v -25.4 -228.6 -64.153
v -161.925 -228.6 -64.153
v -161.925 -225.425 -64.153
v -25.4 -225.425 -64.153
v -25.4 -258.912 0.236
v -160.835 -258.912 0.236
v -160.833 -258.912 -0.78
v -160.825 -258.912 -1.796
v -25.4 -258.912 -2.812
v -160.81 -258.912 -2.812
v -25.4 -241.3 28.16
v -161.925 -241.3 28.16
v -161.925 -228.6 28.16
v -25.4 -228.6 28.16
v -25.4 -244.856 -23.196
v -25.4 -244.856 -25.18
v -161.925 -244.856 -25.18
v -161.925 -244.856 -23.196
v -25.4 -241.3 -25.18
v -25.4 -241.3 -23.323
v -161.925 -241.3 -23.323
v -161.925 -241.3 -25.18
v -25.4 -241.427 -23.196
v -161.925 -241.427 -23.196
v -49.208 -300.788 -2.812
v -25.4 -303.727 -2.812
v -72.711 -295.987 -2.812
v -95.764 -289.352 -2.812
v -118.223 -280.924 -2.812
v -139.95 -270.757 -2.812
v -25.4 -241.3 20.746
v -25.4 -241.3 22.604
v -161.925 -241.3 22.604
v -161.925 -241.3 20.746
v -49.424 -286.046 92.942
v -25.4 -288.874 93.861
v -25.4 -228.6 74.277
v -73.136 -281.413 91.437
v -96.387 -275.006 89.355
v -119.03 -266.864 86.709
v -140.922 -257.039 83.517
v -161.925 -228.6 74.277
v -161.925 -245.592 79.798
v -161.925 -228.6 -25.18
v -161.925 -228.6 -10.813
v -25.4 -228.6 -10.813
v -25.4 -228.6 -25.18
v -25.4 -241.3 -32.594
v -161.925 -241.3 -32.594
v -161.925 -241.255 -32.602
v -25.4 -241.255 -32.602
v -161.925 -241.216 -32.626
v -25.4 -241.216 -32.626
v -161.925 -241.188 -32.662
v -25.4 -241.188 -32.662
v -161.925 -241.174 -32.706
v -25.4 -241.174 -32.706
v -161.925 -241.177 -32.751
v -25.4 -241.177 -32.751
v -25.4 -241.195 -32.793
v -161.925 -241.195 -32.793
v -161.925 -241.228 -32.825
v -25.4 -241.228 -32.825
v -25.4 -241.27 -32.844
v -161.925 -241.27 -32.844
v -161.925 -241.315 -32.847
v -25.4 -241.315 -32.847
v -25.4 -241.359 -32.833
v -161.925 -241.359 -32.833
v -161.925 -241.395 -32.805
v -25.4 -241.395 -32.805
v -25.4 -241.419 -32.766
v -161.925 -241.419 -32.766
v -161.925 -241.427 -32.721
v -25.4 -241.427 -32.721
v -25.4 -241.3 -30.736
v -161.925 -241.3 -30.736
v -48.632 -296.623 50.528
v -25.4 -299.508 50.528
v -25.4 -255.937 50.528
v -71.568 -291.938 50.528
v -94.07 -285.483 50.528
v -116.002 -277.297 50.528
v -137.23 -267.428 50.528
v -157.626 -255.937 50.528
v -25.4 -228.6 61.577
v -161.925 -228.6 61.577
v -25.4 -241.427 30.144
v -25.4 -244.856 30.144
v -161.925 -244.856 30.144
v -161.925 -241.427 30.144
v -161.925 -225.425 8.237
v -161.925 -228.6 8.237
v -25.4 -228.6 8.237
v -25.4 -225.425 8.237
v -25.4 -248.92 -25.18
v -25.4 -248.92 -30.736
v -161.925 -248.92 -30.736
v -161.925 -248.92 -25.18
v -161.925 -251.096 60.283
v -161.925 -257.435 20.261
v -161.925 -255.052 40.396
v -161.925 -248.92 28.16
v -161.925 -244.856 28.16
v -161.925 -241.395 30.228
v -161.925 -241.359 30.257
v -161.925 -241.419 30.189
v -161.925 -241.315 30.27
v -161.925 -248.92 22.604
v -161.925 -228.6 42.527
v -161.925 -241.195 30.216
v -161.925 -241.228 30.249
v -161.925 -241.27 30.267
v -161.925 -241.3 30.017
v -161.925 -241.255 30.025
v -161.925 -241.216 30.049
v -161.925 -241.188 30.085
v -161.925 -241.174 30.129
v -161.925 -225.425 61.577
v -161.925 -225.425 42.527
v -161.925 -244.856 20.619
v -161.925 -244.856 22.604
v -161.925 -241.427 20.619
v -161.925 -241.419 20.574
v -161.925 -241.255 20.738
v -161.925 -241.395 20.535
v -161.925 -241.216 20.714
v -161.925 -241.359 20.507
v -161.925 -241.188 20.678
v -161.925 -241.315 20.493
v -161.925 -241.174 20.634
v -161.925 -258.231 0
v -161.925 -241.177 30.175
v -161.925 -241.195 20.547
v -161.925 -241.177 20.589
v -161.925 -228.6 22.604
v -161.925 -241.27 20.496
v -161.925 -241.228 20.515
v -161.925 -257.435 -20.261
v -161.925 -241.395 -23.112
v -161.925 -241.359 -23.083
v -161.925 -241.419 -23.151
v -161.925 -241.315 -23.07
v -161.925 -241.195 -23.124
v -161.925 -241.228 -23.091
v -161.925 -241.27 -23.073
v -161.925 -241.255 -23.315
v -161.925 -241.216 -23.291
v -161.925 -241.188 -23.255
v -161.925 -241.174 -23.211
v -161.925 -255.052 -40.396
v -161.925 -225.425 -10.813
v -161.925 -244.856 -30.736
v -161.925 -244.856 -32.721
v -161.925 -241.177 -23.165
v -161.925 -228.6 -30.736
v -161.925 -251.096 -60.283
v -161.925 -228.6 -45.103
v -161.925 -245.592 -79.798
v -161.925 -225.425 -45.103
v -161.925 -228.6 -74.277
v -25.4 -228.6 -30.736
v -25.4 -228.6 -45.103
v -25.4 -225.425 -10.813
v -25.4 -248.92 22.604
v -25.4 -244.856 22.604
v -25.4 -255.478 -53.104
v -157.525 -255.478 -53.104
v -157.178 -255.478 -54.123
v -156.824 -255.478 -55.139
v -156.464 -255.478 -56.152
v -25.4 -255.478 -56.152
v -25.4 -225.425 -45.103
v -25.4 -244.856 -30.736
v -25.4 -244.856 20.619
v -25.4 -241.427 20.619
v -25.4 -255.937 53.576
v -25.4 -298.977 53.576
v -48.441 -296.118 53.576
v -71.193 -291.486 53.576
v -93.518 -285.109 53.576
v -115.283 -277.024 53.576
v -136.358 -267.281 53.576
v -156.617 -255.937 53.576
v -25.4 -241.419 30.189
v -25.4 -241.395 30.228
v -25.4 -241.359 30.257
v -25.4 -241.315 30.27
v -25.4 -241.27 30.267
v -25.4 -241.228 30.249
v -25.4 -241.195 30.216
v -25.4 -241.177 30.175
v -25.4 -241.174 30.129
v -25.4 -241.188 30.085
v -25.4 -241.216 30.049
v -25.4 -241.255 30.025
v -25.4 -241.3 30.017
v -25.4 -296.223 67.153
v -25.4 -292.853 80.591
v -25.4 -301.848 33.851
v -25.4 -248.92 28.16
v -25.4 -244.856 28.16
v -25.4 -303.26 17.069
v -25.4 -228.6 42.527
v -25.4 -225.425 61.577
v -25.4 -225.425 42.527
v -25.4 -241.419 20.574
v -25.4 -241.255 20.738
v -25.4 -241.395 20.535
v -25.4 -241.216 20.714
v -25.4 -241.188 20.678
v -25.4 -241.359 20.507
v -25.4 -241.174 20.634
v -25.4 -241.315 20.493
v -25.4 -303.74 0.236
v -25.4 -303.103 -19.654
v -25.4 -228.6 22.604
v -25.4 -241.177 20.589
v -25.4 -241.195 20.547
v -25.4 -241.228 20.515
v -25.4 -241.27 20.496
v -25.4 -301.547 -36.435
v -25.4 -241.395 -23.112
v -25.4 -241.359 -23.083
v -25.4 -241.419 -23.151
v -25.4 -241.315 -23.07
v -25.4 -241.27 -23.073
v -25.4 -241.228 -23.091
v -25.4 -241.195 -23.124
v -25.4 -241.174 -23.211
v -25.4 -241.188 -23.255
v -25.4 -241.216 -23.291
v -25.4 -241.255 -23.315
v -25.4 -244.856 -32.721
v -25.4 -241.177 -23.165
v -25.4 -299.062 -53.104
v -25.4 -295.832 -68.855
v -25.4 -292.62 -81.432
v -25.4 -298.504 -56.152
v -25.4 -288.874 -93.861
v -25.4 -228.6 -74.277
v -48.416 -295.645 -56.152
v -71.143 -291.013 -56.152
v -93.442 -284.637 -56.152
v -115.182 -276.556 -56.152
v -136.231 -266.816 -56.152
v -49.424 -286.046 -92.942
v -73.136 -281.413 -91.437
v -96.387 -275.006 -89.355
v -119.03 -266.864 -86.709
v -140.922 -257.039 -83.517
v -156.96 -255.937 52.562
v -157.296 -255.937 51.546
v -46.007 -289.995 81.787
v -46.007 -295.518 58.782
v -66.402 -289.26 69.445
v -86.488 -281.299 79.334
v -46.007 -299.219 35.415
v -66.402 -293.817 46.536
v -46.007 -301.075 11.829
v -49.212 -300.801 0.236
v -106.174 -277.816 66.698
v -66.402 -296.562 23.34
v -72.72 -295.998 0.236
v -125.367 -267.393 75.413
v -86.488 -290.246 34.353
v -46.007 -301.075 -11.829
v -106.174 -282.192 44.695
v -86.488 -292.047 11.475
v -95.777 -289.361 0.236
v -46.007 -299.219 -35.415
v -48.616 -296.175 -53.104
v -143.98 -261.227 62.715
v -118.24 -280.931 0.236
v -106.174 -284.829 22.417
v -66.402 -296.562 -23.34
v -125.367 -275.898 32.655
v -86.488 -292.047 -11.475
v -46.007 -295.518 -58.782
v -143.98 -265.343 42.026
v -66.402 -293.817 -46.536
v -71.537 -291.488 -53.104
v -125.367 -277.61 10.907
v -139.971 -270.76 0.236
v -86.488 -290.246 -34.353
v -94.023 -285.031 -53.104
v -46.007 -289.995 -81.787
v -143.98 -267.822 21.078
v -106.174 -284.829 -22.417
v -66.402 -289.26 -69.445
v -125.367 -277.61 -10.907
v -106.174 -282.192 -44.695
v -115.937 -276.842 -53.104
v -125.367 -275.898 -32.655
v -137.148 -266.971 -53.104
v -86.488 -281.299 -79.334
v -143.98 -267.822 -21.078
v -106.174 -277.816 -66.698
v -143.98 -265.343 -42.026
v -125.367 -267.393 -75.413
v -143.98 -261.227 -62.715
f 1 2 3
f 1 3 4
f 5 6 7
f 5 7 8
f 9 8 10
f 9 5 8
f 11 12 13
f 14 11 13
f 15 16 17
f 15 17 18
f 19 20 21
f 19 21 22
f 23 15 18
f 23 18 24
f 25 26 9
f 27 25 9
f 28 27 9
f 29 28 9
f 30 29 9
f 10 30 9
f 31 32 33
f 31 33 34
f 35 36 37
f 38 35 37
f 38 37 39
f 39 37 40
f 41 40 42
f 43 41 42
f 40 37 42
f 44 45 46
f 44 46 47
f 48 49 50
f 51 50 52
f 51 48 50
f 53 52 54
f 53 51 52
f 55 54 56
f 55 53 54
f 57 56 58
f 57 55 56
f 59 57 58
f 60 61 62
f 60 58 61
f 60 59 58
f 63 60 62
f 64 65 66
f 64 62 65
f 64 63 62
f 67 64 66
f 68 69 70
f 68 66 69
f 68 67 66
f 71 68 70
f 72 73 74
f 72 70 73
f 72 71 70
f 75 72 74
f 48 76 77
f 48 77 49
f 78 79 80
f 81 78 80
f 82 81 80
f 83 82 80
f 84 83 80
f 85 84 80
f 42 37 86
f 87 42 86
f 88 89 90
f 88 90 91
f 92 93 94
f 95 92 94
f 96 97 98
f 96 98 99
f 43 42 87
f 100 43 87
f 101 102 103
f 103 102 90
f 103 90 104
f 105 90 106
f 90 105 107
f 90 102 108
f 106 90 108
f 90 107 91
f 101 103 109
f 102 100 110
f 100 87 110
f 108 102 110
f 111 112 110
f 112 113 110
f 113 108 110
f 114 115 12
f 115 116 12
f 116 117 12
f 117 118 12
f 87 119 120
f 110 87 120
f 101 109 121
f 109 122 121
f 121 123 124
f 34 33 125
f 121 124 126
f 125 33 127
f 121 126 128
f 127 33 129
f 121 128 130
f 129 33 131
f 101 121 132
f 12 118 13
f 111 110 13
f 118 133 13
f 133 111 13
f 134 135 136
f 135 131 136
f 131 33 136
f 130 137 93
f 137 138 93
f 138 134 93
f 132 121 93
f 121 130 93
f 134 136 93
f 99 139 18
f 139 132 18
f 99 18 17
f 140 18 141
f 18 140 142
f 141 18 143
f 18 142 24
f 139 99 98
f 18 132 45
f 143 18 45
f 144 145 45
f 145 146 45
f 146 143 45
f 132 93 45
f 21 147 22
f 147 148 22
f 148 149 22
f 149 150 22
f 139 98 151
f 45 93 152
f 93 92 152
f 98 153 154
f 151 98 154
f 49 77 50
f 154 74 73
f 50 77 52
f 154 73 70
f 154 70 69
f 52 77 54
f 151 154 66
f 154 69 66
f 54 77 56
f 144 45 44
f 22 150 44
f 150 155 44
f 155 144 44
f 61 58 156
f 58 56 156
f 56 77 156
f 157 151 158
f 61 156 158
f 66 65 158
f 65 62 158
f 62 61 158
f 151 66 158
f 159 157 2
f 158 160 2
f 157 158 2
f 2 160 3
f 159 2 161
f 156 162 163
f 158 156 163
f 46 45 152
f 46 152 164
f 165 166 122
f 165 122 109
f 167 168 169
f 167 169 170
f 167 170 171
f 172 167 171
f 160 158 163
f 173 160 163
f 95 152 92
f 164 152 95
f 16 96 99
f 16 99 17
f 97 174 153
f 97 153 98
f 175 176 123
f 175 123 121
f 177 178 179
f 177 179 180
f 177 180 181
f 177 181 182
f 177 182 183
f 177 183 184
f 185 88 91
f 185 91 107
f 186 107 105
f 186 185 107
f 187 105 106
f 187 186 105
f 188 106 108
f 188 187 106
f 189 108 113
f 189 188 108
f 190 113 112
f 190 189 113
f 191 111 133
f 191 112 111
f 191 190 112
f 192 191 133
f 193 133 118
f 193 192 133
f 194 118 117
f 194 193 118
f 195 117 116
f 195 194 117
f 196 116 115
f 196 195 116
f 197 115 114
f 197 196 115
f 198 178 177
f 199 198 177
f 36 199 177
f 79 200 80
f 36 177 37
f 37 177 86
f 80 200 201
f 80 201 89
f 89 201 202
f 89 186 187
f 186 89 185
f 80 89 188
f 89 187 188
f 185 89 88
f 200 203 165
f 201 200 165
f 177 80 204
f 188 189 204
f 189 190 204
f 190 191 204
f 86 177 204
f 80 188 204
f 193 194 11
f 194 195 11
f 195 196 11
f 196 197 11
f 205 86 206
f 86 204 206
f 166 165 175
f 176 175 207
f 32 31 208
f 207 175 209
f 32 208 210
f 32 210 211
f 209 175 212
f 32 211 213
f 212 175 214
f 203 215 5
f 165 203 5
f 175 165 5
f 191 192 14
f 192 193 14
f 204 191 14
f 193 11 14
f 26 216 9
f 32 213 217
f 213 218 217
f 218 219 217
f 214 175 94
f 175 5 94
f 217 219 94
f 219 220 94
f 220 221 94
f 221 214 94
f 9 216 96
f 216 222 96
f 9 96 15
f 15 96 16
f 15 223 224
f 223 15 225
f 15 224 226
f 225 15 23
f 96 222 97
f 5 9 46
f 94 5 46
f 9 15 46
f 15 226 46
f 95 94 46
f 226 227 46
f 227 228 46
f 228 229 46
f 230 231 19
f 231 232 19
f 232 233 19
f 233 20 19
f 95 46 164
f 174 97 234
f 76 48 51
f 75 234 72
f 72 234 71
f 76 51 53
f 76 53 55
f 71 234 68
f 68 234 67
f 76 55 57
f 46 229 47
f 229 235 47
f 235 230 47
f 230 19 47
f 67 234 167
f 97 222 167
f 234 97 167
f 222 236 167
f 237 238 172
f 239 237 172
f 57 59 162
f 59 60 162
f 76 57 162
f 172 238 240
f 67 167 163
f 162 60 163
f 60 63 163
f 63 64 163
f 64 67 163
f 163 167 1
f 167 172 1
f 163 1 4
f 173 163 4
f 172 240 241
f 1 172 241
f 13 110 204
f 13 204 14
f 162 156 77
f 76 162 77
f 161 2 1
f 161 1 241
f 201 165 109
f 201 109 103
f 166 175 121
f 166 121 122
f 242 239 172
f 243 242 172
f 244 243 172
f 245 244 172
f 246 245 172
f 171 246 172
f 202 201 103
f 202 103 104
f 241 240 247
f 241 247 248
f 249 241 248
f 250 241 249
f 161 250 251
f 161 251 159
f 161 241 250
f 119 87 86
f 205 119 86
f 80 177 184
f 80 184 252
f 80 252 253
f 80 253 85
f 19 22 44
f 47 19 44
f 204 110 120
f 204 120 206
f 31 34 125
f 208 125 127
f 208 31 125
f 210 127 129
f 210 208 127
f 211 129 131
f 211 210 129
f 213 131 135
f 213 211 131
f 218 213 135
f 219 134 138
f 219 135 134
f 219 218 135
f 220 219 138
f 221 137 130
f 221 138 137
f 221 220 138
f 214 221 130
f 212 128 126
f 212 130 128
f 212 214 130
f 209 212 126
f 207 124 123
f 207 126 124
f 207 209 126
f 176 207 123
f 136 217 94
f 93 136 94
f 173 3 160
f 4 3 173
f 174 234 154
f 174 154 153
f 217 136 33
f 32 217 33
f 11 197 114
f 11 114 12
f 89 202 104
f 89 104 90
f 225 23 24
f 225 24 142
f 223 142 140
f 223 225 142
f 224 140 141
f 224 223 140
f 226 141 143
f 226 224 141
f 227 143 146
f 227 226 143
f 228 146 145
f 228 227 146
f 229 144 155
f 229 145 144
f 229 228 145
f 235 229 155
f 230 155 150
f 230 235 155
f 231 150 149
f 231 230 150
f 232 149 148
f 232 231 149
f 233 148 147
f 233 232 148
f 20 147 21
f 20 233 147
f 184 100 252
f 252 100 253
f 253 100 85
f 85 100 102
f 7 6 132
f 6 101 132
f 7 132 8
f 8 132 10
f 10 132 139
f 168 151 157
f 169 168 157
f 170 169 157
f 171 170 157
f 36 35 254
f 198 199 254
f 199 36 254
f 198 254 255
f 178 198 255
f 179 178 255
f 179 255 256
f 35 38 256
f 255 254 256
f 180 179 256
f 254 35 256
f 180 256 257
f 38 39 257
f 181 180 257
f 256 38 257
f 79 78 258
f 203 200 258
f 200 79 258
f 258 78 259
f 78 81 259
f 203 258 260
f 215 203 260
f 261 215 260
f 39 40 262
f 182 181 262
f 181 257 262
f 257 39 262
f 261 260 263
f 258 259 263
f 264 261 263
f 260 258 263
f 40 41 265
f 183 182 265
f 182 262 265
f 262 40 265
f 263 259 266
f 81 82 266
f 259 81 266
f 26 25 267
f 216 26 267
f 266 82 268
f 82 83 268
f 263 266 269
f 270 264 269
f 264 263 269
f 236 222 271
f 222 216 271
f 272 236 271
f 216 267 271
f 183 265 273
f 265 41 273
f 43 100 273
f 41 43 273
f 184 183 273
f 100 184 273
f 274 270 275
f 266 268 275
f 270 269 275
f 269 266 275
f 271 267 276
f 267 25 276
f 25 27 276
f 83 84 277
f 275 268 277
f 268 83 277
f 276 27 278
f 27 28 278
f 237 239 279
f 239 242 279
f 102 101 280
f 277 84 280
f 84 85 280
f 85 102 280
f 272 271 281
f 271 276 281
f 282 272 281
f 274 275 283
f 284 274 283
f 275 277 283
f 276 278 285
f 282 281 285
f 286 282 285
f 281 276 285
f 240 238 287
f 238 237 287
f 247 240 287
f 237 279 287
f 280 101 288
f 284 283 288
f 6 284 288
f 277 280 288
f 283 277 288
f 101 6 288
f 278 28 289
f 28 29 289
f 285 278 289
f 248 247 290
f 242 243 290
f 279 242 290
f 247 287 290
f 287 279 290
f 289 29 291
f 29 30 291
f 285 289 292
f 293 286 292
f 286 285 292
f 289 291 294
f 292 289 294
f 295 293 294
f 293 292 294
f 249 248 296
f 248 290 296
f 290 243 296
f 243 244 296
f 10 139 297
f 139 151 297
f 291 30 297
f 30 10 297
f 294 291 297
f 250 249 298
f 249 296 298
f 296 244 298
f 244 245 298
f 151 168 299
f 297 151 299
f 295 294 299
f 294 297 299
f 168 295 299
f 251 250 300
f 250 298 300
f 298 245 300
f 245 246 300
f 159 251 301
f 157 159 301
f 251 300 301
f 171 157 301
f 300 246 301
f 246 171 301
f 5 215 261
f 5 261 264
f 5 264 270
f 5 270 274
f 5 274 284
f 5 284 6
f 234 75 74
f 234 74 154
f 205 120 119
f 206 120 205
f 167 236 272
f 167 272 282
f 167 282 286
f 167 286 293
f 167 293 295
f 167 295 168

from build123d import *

# Parameters (mm, degrees)
REVOLVE1_ANGLE      = 36
SKETCH2_W           = 185.252199215
SKETCH2_H           = 56.371609172
CUT_EXTRUDE1_DEPTH  = 365.059347887
SKETCH5_W           = 55.655123519
SKETCH5_H           = 148.553285118
CUT_EXTRUDE2_DEPTH  = 235.735844279
SKETCH6_W           = 162.024812579
SKETCH6_H           = 19.05
BOSS_EXTRUDE1_DEPTH = 3.175
LPATTERN1_COUNT     = 3
LPATTERN1_PITCH     = 53.34
CUT_EXTRUDE3_DEPTH  = 357.818950588
LPATTERN2_COUNT     = 2
LPATTERN2_PITCH     = 53.34
SKETCH8_W           = 53.705765401
SKETCH8_H           = 196.003453697
CUT_EXTRUDE4_DEPTH  = 224.765760383
SKETCH10_W          = 3.048
SKETCH10_H          = 86.618344978
SKETCH10_H_2        = 89.651067892
CUT_EXTRUDE6_DEPTH  = 176.53


with BuildPart() as part:
    # Sketch1 → Revolve1 (revolve, symmetric)
    with BuildSketch(Plane.XY) as revolve1_sk:
        with BuildLine():
            Line((-202.80204389, -227.539822875), (-25.4, -227.539822875))
            Line((-25.4, -227.539822875), (-25.4, -303.739822875))
            ThreePointArc((-25.4, -303.739822875), (-120.294028152, -280.057827584), (-202.80204389, -227.539822875))
        make_face()
    revolve(axis=Axis((0, 0, 0), (-1, 0, 0)), revolution_arc=REVOLVE1_ANGLE / 2)
    revolve(revolve1_sk.sketch, axis=Axis((0, 0, 0), (1, 0, 0)), revolution_arc=REVOLVE1_ANGLE / 2)

    # Sketch2 → Cut-Extrude1 (cut, through all)
    with BuildSketch(Plane(origin=(-25.4, 0, 0), x_dir=(0, 0, -1), z_dir=(1, 0, 0))):
        with Locations((3.182919918, -200.414195414)):
            Rectangle(SKETCH2_W, SKETCH2_H)
    extrude(amount=-CUT_EXTRUDE1_DEPTH, mode=Mode.SUBTRACT)

    # Sketch5 → Cut-Extrude2 (cut, through all)
    with BuildSketch(Plane(origin=(0, -228.6, 0), x_dir=(1, 0, 0), z_dir=(0, 1, 0))):
        with Locations((-215.252374339, 0)):
            Rectangle(SKETCH5_W, SKETCH5_H)
    extrude(amount=-CUT_EXTRUDE2_DEPTH, mode=Mode.SUBTRACT)

    # Sketch6 → Boss-Extrude1 (add)
    with BuildSketch(Plane(origin=(0, -228.6, 0), x_dir=(1, 0, 0), z_dir=(0, 1, 0))):
        with Locations((-106.41240629, -52.051642559)):
            Rectangle(SKETCH6_W, SKETCH6_H)
    boss_extrude1 = extrude(amount=BOSS_EXTRUDE1_DEPTH)

    # LPattern1: Boss-Extrude1 ×3
    with Locations(*[(0, 0, -i * LPATTERN1_PITCH) for i in range(1, LPATTERN1_COUNT)]):
        add(boss_extrude1)

    # Sketch7 → Cut-Extrude3 (cut, through all)
    with BuildSketch(Plane(origin=(-25.4, 0, 0), x_dir=(0, 0, -1), z_dir=(1, 0, 0))):
        with BuildLine():
            Line((-22.603517559, -244.856), (-22.603517559, -248.92))
            Line((-22.603517559, -248.92), (-28.159767559, -248.92))
            Line((-28.159767559, -248.92), (-28.159767559, -244.856))
            Line((-28.159767559, -244.856), (-30.144142559, -244.856))
            Line((-30.144142559, -244.856), (-30.144142559, -241.427))
            ThreePointArc((-30.144142559, -241.427), (-30.23394512, -241.210197439), (-30.017142559, -241.3))
            Line((-30.017142559, -241.3), (-28.159767559, -241.3))
            Line((-28.159767559, -241.3), (-28.159767559, -228.6))
            Line((-28.159767559, -228.6), (-22.603517559, -228.6))
            Line((-22.603517559, -228.6), (-22.603517559, -241.3))
            Line((-22.603517559, -241.3), (-20.746142559, -241.3))
            ThreePointArc((-20.746142559, -241.3), (-20.529339998, -241.210197439), (-20.619142559, -241.427))
            Line((-20.619142559, -241.427), (-20.619142559, -244.856))
            Line((-20.619142559, -244.856), (-22.603517559, -244.856))
        make_face()
    cut_extrude3 = extrude(amount=-CUT_EXTRUDE3_DEPTH, mode=Mode.SUBTRACT)

    # LPattern2: Cut-Extrude3 ×2
    with Locations(*[(0, 0, -i * LPATTERN2_PITCH) for i in range(1, LPATTERN2_COUNT)]):
        add(cut_extrude3, mode=Mode.SUBTRACT)

    # Sketch8 → Cut-Extrude4 (cut, through all)
    with BuildSketch(Plane(origin=(0, -225.425, 0), x_dir=(1, 0, 0), z_dir=(0, 1, 0))):
        with Locations((-188.777882701, -12.617417505)):
            Rectangle(SKETCH8_W, SKETCH8_H)
    extrude(amount=-CUT_EXTRUDE4_DEPTH, mode=Mode.SUBTRACT)

    # Sketch10 → Cut-Extrude6 (cut)
    with BuildSketch(Plane(origin=(0, 0, 0), x_dir=(0, 0, -1), z_dir=(1, 0, 0))):
        with Locations((54.628357441, -298.786918327)):
            Rectangle(SKETCH10_W, SKETCH10_H)
        with Locations((1.288357441, -303.737090483)):
            Rectangle(SKETCH10_W, SKETCH10_H_2)
        with Locations((-52.051642559, -299.246564737)):
            Rectangle(SKETCH10_W, SKETCH10_H)
    extrude(amount=-CUT_EXTRUDE6_DEPTH, mode=Mode.SUBTRACT)


solid = part.part
